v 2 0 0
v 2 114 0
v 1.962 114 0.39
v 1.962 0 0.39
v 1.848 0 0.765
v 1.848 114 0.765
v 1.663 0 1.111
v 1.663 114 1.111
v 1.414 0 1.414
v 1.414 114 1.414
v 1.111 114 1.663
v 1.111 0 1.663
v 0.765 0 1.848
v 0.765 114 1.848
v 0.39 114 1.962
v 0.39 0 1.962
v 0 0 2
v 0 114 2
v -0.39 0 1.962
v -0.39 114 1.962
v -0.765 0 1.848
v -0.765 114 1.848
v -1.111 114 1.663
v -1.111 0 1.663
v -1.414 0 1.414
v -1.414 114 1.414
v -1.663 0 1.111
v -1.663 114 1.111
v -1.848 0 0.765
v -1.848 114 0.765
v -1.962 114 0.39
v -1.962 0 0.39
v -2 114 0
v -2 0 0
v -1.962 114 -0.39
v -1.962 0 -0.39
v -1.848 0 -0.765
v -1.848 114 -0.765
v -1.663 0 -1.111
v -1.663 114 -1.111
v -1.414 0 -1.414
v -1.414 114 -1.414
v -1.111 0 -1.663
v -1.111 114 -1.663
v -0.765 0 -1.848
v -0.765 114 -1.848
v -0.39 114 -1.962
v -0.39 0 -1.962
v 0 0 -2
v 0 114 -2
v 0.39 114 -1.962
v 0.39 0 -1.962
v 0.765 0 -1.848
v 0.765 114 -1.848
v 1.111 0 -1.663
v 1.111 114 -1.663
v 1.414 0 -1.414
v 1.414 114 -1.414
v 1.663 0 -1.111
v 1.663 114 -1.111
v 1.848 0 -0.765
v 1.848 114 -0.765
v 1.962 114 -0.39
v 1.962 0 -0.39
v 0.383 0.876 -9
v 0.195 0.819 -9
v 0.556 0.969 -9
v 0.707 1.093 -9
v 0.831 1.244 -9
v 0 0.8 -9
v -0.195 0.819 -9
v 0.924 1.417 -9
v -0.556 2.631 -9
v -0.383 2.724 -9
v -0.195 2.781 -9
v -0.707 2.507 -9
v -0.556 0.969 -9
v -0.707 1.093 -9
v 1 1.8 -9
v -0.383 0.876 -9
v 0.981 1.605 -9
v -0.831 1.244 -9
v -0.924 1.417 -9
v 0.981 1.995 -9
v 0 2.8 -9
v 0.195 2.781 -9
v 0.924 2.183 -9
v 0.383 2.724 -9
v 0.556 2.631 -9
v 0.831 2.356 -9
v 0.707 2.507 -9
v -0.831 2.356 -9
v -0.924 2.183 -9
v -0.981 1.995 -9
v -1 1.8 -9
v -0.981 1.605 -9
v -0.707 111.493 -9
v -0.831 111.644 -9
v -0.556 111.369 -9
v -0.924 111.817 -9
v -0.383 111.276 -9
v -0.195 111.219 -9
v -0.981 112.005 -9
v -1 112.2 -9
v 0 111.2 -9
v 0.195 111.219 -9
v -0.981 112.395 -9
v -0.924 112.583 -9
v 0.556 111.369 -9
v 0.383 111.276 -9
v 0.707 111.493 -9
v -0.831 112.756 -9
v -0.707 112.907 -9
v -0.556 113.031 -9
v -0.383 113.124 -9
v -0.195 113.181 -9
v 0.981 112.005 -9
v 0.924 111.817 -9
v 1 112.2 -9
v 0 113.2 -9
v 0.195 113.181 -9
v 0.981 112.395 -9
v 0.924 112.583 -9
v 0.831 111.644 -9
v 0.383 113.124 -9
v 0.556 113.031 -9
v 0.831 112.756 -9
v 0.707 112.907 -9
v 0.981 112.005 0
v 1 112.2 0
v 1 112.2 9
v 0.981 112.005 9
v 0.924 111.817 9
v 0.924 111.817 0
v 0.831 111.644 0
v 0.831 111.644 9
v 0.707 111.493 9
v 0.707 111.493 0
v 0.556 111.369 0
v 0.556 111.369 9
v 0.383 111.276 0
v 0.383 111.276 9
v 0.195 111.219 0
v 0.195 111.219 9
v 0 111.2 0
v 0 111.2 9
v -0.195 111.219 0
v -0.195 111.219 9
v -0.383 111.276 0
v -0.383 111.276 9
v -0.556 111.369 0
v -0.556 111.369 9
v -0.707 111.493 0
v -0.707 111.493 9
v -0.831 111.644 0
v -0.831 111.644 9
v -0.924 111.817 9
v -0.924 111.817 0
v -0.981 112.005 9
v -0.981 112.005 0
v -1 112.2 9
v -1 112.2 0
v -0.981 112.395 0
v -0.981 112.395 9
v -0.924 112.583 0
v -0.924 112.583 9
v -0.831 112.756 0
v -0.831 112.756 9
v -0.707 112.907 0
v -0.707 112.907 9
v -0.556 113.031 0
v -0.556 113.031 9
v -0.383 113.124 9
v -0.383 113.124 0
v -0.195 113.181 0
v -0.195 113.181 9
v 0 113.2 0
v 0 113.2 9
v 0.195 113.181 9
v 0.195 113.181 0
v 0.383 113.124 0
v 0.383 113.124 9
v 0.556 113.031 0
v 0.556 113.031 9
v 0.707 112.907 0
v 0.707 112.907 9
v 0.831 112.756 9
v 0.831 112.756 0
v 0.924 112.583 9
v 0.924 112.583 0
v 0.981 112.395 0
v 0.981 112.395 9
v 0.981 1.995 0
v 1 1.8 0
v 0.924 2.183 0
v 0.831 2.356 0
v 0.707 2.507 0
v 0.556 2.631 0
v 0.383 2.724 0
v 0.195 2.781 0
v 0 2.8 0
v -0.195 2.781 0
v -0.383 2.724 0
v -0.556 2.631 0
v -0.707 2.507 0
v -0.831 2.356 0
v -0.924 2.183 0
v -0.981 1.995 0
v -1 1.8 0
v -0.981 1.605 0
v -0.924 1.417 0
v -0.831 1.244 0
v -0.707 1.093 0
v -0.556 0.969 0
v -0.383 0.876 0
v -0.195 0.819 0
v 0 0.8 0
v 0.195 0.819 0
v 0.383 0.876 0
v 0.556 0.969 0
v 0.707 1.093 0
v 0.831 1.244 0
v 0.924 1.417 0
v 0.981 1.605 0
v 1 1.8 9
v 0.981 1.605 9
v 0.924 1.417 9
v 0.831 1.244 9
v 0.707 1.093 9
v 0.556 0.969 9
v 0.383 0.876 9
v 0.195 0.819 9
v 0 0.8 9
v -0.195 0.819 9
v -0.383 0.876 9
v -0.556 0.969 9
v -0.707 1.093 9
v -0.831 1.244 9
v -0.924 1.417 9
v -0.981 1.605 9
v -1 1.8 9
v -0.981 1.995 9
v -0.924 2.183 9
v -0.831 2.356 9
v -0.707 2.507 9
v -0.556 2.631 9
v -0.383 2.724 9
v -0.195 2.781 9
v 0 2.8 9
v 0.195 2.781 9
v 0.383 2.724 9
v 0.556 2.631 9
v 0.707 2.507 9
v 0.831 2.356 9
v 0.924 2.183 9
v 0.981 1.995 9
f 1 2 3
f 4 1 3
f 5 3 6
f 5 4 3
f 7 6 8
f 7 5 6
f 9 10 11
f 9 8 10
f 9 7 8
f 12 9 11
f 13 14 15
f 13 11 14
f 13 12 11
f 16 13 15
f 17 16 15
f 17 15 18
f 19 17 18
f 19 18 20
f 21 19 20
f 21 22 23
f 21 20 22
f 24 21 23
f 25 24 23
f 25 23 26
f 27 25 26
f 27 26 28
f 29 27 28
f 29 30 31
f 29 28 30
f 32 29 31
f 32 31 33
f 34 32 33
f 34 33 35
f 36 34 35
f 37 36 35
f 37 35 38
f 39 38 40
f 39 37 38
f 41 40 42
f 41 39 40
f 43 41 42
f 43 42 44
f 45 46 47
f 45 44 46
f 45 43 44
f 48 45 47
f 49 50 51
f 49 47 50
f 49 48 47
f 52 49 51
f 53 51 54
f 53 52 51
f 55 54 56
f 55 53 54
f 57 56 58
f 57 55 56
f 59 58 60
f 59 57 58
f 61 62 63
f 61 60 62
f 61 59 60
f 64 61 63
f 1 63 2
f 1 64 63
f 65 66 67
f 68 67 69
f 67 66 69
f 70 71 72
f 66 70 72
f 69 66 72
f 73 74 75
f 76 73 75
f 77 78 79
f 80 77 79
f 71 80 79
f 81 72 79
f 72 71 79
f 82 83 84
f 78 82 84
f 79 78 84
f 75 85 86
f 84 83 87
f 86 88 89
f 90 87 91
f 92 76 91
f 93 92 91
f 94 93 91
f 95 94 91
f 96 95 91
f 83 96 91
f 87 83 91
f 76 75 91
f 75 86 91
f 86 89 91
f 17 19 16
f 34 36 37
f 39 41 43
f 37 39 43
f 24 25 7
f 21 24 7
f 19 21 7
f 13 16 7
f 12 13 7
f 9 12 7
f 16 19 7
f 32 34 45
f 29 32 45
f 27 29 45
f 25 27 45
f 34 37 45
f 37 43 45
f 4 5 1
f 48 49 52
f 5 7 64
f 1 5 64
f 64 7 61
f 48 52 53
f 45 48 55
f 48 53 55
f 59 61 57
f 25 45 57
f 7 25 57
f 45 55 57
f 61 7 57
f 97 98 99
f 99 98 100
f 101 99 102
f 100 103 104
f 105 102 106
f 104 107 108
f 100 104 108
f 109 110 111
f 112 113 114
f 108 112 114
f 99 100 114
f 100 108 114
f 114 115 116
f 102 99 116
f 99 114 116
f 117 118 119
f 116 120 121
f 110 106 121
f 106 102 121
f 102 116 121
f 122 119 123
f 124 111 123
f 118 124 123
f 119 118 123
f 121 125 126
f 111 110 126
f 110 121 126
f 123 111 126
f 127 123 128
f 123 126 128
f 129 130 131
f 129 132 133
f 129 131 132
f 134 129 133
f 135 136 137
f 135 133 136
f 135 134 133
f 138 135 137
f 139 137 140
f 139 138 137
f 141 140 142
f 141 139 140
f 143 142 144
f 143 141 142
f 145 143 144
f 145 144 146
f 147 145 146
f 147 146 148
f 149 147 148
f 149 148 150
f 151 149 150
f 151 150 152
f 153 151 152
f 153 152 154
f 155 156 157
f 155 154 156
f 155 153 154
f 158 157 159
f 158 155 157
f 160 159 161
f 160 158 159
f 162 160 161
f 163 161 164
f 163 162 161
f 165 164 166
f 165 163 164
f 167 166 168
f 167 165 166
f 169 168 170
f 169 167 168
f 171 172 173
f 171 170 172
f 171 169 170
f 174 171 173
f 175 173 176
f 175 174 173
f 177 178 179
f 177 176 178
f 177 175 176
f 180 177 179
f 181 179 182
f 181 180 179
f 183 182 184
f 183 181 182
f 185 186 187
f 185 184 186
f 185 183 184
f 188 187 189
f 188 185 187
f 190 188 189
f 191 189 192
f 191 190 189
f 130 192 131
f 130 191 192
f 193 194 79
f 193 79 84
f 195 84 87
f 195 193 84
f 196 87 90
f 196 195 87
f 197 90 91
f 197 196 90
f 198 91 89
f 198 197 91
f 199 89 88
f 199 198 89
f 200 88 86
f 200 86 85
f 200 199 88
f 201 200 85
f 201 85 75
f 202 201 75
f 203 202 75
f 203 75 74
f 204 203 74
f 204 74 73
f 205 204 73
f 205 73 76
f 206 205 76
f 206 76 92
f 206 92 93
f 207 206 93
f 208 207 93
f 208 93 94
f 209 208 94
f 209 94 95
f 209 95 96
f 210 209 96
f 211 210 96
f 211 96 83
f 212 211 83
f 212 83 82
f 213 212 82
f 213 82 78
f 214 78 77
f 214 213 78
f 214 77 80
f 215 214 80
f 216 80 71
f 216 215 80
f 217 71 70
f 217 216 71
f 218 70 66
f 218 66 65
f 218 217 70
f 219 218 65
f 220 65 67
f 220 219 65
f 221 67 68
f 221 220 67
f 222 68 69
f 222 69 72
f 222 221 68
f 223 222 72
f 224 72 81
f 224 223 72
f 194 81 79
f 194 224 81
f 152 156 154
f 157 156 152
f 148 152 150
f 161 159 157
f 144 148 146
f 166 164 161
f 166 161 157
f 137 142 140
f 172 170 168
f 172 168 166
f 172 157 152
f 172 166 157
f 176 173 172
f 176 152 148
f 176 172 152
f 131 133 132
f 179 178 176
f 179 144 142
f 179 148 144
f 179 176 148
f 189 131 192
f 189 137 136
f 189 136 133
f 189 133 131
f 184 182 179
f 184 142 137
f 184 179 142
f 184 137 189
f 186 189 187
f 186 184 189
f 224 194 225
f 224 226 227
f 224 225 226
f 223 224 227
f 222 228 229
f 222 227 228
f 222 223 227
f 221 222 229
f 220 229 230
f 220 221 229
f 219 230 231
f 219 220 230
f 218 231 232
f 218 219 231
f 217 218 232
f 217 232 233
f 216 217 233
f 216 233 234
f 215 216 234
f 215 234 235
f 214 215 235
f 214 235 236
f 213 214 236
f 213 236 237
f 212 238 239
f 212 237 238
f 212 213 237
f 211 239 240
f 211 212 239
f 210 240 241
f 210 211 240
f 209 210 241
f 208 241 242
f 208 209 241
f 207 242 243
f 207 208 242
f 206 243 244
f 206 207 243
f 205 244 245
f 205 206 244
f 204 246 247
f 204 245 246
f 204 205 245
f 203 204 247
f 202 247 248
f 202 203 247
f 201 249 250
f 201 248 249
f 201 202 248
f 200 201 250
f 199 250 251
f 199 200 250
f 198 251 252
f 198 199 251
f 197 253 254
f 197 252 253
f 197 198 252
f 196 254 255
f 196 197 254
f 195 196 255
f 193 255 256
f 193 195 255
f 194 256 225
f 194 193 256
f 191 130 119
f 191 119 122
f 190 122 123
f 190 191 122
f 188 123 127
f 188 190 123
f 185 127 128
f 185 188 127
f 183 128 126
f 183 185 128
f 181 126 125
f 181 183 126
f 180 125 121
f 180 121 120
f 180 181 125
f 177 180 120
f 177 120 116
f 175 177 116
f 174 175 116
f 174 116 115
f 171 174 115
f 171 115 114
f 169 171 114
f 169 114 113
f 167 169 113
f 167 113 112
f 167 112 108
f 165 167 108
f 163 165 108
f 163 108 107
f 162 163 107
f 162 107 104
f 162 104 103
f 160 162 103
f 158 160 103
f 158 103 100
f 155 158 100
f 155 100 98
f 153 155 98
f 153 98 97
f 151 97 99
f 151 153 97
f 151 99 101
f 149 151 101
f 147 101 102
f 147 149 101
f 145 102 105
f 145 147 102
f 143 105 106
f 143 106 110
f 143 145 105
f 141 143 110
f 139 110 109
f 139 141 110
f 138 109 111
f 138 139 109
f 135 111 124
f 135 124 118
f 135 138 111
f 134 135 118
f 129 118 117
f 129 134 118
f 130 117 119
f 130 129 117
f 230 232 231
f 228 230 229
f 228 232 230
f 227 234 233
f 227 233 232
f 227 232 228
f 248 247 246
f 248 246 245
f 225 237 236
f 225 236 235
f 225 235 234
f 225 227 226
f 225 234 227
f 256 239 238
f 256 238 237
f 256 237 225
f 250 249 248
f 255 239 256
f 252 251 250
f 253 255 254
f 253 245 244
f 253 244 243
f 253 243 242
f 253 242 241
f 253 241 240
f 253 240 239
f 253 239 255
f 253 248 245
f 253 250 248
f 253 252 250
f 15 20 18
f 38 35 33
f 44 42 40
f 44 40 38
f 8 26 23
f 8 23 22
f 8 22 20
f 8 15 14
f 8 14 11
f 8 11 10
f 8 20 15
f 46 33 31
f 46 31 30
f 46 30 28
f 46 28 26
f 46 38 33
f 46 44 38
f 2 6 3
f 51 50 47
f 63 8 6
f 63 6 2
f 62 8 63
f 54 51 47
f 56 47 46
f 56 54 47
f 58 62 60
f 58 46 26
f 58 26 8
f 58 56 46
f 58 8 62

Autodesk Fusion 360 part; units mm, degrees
sketch "Sketch1" plane through (0, 0, 0) normal (0, 1, 0) x (1, 0, 0)
  circle A0 centre (0, 0) radius 2
  dimension "d5" = 4
extrude "Extrude1" add sketch "Sketch1" along normal blind 114 makes body 1
sketch "Sketch2" plane through (0, 0, 0) normal (0, 0, 1) x (1, 0, 0)
  circle A0 centre (0, 1.8) radius 1
  circle A1 centre (0, 112.2) radius 1
  line L0 (2, 114) -> (-2, 114)
  dimension "d9" = 2
  dimension "d10" = 2
  dimension "d15" = 1.8
  dimension "d16" = 1.8
extrude "Extrude2" add sketch "Sketch2" along normal mid plane 18 separate body contours A1 makes body 2
extrude "Extrude3" add sketch "Sketch2" along normal mid plane 18 separate body contours A0 makes body 3
equation "length = 114 mm"
equation "radius = 2 mm"
equation "cup_little_bone_radius = 1 mm"
equation "cup_little_bone_length = 18 mm"
equation "d5 = radius * 2"
equation "edge_cup_little_bone_distance = 1.8 mm"
equation "d7 = length"
equation "d9 = cup_little_bone_radius * 2"
equation "d10 = cup_little_bone_radius * 2"
equation "d11 = cup_little_bone_length / 2"
equation "d13 = cup_little_bone_length / 2"
equation "d15 = edge_cup_little_bone_distance"
equation "d16 = edge_cup_little_bone_distance"
